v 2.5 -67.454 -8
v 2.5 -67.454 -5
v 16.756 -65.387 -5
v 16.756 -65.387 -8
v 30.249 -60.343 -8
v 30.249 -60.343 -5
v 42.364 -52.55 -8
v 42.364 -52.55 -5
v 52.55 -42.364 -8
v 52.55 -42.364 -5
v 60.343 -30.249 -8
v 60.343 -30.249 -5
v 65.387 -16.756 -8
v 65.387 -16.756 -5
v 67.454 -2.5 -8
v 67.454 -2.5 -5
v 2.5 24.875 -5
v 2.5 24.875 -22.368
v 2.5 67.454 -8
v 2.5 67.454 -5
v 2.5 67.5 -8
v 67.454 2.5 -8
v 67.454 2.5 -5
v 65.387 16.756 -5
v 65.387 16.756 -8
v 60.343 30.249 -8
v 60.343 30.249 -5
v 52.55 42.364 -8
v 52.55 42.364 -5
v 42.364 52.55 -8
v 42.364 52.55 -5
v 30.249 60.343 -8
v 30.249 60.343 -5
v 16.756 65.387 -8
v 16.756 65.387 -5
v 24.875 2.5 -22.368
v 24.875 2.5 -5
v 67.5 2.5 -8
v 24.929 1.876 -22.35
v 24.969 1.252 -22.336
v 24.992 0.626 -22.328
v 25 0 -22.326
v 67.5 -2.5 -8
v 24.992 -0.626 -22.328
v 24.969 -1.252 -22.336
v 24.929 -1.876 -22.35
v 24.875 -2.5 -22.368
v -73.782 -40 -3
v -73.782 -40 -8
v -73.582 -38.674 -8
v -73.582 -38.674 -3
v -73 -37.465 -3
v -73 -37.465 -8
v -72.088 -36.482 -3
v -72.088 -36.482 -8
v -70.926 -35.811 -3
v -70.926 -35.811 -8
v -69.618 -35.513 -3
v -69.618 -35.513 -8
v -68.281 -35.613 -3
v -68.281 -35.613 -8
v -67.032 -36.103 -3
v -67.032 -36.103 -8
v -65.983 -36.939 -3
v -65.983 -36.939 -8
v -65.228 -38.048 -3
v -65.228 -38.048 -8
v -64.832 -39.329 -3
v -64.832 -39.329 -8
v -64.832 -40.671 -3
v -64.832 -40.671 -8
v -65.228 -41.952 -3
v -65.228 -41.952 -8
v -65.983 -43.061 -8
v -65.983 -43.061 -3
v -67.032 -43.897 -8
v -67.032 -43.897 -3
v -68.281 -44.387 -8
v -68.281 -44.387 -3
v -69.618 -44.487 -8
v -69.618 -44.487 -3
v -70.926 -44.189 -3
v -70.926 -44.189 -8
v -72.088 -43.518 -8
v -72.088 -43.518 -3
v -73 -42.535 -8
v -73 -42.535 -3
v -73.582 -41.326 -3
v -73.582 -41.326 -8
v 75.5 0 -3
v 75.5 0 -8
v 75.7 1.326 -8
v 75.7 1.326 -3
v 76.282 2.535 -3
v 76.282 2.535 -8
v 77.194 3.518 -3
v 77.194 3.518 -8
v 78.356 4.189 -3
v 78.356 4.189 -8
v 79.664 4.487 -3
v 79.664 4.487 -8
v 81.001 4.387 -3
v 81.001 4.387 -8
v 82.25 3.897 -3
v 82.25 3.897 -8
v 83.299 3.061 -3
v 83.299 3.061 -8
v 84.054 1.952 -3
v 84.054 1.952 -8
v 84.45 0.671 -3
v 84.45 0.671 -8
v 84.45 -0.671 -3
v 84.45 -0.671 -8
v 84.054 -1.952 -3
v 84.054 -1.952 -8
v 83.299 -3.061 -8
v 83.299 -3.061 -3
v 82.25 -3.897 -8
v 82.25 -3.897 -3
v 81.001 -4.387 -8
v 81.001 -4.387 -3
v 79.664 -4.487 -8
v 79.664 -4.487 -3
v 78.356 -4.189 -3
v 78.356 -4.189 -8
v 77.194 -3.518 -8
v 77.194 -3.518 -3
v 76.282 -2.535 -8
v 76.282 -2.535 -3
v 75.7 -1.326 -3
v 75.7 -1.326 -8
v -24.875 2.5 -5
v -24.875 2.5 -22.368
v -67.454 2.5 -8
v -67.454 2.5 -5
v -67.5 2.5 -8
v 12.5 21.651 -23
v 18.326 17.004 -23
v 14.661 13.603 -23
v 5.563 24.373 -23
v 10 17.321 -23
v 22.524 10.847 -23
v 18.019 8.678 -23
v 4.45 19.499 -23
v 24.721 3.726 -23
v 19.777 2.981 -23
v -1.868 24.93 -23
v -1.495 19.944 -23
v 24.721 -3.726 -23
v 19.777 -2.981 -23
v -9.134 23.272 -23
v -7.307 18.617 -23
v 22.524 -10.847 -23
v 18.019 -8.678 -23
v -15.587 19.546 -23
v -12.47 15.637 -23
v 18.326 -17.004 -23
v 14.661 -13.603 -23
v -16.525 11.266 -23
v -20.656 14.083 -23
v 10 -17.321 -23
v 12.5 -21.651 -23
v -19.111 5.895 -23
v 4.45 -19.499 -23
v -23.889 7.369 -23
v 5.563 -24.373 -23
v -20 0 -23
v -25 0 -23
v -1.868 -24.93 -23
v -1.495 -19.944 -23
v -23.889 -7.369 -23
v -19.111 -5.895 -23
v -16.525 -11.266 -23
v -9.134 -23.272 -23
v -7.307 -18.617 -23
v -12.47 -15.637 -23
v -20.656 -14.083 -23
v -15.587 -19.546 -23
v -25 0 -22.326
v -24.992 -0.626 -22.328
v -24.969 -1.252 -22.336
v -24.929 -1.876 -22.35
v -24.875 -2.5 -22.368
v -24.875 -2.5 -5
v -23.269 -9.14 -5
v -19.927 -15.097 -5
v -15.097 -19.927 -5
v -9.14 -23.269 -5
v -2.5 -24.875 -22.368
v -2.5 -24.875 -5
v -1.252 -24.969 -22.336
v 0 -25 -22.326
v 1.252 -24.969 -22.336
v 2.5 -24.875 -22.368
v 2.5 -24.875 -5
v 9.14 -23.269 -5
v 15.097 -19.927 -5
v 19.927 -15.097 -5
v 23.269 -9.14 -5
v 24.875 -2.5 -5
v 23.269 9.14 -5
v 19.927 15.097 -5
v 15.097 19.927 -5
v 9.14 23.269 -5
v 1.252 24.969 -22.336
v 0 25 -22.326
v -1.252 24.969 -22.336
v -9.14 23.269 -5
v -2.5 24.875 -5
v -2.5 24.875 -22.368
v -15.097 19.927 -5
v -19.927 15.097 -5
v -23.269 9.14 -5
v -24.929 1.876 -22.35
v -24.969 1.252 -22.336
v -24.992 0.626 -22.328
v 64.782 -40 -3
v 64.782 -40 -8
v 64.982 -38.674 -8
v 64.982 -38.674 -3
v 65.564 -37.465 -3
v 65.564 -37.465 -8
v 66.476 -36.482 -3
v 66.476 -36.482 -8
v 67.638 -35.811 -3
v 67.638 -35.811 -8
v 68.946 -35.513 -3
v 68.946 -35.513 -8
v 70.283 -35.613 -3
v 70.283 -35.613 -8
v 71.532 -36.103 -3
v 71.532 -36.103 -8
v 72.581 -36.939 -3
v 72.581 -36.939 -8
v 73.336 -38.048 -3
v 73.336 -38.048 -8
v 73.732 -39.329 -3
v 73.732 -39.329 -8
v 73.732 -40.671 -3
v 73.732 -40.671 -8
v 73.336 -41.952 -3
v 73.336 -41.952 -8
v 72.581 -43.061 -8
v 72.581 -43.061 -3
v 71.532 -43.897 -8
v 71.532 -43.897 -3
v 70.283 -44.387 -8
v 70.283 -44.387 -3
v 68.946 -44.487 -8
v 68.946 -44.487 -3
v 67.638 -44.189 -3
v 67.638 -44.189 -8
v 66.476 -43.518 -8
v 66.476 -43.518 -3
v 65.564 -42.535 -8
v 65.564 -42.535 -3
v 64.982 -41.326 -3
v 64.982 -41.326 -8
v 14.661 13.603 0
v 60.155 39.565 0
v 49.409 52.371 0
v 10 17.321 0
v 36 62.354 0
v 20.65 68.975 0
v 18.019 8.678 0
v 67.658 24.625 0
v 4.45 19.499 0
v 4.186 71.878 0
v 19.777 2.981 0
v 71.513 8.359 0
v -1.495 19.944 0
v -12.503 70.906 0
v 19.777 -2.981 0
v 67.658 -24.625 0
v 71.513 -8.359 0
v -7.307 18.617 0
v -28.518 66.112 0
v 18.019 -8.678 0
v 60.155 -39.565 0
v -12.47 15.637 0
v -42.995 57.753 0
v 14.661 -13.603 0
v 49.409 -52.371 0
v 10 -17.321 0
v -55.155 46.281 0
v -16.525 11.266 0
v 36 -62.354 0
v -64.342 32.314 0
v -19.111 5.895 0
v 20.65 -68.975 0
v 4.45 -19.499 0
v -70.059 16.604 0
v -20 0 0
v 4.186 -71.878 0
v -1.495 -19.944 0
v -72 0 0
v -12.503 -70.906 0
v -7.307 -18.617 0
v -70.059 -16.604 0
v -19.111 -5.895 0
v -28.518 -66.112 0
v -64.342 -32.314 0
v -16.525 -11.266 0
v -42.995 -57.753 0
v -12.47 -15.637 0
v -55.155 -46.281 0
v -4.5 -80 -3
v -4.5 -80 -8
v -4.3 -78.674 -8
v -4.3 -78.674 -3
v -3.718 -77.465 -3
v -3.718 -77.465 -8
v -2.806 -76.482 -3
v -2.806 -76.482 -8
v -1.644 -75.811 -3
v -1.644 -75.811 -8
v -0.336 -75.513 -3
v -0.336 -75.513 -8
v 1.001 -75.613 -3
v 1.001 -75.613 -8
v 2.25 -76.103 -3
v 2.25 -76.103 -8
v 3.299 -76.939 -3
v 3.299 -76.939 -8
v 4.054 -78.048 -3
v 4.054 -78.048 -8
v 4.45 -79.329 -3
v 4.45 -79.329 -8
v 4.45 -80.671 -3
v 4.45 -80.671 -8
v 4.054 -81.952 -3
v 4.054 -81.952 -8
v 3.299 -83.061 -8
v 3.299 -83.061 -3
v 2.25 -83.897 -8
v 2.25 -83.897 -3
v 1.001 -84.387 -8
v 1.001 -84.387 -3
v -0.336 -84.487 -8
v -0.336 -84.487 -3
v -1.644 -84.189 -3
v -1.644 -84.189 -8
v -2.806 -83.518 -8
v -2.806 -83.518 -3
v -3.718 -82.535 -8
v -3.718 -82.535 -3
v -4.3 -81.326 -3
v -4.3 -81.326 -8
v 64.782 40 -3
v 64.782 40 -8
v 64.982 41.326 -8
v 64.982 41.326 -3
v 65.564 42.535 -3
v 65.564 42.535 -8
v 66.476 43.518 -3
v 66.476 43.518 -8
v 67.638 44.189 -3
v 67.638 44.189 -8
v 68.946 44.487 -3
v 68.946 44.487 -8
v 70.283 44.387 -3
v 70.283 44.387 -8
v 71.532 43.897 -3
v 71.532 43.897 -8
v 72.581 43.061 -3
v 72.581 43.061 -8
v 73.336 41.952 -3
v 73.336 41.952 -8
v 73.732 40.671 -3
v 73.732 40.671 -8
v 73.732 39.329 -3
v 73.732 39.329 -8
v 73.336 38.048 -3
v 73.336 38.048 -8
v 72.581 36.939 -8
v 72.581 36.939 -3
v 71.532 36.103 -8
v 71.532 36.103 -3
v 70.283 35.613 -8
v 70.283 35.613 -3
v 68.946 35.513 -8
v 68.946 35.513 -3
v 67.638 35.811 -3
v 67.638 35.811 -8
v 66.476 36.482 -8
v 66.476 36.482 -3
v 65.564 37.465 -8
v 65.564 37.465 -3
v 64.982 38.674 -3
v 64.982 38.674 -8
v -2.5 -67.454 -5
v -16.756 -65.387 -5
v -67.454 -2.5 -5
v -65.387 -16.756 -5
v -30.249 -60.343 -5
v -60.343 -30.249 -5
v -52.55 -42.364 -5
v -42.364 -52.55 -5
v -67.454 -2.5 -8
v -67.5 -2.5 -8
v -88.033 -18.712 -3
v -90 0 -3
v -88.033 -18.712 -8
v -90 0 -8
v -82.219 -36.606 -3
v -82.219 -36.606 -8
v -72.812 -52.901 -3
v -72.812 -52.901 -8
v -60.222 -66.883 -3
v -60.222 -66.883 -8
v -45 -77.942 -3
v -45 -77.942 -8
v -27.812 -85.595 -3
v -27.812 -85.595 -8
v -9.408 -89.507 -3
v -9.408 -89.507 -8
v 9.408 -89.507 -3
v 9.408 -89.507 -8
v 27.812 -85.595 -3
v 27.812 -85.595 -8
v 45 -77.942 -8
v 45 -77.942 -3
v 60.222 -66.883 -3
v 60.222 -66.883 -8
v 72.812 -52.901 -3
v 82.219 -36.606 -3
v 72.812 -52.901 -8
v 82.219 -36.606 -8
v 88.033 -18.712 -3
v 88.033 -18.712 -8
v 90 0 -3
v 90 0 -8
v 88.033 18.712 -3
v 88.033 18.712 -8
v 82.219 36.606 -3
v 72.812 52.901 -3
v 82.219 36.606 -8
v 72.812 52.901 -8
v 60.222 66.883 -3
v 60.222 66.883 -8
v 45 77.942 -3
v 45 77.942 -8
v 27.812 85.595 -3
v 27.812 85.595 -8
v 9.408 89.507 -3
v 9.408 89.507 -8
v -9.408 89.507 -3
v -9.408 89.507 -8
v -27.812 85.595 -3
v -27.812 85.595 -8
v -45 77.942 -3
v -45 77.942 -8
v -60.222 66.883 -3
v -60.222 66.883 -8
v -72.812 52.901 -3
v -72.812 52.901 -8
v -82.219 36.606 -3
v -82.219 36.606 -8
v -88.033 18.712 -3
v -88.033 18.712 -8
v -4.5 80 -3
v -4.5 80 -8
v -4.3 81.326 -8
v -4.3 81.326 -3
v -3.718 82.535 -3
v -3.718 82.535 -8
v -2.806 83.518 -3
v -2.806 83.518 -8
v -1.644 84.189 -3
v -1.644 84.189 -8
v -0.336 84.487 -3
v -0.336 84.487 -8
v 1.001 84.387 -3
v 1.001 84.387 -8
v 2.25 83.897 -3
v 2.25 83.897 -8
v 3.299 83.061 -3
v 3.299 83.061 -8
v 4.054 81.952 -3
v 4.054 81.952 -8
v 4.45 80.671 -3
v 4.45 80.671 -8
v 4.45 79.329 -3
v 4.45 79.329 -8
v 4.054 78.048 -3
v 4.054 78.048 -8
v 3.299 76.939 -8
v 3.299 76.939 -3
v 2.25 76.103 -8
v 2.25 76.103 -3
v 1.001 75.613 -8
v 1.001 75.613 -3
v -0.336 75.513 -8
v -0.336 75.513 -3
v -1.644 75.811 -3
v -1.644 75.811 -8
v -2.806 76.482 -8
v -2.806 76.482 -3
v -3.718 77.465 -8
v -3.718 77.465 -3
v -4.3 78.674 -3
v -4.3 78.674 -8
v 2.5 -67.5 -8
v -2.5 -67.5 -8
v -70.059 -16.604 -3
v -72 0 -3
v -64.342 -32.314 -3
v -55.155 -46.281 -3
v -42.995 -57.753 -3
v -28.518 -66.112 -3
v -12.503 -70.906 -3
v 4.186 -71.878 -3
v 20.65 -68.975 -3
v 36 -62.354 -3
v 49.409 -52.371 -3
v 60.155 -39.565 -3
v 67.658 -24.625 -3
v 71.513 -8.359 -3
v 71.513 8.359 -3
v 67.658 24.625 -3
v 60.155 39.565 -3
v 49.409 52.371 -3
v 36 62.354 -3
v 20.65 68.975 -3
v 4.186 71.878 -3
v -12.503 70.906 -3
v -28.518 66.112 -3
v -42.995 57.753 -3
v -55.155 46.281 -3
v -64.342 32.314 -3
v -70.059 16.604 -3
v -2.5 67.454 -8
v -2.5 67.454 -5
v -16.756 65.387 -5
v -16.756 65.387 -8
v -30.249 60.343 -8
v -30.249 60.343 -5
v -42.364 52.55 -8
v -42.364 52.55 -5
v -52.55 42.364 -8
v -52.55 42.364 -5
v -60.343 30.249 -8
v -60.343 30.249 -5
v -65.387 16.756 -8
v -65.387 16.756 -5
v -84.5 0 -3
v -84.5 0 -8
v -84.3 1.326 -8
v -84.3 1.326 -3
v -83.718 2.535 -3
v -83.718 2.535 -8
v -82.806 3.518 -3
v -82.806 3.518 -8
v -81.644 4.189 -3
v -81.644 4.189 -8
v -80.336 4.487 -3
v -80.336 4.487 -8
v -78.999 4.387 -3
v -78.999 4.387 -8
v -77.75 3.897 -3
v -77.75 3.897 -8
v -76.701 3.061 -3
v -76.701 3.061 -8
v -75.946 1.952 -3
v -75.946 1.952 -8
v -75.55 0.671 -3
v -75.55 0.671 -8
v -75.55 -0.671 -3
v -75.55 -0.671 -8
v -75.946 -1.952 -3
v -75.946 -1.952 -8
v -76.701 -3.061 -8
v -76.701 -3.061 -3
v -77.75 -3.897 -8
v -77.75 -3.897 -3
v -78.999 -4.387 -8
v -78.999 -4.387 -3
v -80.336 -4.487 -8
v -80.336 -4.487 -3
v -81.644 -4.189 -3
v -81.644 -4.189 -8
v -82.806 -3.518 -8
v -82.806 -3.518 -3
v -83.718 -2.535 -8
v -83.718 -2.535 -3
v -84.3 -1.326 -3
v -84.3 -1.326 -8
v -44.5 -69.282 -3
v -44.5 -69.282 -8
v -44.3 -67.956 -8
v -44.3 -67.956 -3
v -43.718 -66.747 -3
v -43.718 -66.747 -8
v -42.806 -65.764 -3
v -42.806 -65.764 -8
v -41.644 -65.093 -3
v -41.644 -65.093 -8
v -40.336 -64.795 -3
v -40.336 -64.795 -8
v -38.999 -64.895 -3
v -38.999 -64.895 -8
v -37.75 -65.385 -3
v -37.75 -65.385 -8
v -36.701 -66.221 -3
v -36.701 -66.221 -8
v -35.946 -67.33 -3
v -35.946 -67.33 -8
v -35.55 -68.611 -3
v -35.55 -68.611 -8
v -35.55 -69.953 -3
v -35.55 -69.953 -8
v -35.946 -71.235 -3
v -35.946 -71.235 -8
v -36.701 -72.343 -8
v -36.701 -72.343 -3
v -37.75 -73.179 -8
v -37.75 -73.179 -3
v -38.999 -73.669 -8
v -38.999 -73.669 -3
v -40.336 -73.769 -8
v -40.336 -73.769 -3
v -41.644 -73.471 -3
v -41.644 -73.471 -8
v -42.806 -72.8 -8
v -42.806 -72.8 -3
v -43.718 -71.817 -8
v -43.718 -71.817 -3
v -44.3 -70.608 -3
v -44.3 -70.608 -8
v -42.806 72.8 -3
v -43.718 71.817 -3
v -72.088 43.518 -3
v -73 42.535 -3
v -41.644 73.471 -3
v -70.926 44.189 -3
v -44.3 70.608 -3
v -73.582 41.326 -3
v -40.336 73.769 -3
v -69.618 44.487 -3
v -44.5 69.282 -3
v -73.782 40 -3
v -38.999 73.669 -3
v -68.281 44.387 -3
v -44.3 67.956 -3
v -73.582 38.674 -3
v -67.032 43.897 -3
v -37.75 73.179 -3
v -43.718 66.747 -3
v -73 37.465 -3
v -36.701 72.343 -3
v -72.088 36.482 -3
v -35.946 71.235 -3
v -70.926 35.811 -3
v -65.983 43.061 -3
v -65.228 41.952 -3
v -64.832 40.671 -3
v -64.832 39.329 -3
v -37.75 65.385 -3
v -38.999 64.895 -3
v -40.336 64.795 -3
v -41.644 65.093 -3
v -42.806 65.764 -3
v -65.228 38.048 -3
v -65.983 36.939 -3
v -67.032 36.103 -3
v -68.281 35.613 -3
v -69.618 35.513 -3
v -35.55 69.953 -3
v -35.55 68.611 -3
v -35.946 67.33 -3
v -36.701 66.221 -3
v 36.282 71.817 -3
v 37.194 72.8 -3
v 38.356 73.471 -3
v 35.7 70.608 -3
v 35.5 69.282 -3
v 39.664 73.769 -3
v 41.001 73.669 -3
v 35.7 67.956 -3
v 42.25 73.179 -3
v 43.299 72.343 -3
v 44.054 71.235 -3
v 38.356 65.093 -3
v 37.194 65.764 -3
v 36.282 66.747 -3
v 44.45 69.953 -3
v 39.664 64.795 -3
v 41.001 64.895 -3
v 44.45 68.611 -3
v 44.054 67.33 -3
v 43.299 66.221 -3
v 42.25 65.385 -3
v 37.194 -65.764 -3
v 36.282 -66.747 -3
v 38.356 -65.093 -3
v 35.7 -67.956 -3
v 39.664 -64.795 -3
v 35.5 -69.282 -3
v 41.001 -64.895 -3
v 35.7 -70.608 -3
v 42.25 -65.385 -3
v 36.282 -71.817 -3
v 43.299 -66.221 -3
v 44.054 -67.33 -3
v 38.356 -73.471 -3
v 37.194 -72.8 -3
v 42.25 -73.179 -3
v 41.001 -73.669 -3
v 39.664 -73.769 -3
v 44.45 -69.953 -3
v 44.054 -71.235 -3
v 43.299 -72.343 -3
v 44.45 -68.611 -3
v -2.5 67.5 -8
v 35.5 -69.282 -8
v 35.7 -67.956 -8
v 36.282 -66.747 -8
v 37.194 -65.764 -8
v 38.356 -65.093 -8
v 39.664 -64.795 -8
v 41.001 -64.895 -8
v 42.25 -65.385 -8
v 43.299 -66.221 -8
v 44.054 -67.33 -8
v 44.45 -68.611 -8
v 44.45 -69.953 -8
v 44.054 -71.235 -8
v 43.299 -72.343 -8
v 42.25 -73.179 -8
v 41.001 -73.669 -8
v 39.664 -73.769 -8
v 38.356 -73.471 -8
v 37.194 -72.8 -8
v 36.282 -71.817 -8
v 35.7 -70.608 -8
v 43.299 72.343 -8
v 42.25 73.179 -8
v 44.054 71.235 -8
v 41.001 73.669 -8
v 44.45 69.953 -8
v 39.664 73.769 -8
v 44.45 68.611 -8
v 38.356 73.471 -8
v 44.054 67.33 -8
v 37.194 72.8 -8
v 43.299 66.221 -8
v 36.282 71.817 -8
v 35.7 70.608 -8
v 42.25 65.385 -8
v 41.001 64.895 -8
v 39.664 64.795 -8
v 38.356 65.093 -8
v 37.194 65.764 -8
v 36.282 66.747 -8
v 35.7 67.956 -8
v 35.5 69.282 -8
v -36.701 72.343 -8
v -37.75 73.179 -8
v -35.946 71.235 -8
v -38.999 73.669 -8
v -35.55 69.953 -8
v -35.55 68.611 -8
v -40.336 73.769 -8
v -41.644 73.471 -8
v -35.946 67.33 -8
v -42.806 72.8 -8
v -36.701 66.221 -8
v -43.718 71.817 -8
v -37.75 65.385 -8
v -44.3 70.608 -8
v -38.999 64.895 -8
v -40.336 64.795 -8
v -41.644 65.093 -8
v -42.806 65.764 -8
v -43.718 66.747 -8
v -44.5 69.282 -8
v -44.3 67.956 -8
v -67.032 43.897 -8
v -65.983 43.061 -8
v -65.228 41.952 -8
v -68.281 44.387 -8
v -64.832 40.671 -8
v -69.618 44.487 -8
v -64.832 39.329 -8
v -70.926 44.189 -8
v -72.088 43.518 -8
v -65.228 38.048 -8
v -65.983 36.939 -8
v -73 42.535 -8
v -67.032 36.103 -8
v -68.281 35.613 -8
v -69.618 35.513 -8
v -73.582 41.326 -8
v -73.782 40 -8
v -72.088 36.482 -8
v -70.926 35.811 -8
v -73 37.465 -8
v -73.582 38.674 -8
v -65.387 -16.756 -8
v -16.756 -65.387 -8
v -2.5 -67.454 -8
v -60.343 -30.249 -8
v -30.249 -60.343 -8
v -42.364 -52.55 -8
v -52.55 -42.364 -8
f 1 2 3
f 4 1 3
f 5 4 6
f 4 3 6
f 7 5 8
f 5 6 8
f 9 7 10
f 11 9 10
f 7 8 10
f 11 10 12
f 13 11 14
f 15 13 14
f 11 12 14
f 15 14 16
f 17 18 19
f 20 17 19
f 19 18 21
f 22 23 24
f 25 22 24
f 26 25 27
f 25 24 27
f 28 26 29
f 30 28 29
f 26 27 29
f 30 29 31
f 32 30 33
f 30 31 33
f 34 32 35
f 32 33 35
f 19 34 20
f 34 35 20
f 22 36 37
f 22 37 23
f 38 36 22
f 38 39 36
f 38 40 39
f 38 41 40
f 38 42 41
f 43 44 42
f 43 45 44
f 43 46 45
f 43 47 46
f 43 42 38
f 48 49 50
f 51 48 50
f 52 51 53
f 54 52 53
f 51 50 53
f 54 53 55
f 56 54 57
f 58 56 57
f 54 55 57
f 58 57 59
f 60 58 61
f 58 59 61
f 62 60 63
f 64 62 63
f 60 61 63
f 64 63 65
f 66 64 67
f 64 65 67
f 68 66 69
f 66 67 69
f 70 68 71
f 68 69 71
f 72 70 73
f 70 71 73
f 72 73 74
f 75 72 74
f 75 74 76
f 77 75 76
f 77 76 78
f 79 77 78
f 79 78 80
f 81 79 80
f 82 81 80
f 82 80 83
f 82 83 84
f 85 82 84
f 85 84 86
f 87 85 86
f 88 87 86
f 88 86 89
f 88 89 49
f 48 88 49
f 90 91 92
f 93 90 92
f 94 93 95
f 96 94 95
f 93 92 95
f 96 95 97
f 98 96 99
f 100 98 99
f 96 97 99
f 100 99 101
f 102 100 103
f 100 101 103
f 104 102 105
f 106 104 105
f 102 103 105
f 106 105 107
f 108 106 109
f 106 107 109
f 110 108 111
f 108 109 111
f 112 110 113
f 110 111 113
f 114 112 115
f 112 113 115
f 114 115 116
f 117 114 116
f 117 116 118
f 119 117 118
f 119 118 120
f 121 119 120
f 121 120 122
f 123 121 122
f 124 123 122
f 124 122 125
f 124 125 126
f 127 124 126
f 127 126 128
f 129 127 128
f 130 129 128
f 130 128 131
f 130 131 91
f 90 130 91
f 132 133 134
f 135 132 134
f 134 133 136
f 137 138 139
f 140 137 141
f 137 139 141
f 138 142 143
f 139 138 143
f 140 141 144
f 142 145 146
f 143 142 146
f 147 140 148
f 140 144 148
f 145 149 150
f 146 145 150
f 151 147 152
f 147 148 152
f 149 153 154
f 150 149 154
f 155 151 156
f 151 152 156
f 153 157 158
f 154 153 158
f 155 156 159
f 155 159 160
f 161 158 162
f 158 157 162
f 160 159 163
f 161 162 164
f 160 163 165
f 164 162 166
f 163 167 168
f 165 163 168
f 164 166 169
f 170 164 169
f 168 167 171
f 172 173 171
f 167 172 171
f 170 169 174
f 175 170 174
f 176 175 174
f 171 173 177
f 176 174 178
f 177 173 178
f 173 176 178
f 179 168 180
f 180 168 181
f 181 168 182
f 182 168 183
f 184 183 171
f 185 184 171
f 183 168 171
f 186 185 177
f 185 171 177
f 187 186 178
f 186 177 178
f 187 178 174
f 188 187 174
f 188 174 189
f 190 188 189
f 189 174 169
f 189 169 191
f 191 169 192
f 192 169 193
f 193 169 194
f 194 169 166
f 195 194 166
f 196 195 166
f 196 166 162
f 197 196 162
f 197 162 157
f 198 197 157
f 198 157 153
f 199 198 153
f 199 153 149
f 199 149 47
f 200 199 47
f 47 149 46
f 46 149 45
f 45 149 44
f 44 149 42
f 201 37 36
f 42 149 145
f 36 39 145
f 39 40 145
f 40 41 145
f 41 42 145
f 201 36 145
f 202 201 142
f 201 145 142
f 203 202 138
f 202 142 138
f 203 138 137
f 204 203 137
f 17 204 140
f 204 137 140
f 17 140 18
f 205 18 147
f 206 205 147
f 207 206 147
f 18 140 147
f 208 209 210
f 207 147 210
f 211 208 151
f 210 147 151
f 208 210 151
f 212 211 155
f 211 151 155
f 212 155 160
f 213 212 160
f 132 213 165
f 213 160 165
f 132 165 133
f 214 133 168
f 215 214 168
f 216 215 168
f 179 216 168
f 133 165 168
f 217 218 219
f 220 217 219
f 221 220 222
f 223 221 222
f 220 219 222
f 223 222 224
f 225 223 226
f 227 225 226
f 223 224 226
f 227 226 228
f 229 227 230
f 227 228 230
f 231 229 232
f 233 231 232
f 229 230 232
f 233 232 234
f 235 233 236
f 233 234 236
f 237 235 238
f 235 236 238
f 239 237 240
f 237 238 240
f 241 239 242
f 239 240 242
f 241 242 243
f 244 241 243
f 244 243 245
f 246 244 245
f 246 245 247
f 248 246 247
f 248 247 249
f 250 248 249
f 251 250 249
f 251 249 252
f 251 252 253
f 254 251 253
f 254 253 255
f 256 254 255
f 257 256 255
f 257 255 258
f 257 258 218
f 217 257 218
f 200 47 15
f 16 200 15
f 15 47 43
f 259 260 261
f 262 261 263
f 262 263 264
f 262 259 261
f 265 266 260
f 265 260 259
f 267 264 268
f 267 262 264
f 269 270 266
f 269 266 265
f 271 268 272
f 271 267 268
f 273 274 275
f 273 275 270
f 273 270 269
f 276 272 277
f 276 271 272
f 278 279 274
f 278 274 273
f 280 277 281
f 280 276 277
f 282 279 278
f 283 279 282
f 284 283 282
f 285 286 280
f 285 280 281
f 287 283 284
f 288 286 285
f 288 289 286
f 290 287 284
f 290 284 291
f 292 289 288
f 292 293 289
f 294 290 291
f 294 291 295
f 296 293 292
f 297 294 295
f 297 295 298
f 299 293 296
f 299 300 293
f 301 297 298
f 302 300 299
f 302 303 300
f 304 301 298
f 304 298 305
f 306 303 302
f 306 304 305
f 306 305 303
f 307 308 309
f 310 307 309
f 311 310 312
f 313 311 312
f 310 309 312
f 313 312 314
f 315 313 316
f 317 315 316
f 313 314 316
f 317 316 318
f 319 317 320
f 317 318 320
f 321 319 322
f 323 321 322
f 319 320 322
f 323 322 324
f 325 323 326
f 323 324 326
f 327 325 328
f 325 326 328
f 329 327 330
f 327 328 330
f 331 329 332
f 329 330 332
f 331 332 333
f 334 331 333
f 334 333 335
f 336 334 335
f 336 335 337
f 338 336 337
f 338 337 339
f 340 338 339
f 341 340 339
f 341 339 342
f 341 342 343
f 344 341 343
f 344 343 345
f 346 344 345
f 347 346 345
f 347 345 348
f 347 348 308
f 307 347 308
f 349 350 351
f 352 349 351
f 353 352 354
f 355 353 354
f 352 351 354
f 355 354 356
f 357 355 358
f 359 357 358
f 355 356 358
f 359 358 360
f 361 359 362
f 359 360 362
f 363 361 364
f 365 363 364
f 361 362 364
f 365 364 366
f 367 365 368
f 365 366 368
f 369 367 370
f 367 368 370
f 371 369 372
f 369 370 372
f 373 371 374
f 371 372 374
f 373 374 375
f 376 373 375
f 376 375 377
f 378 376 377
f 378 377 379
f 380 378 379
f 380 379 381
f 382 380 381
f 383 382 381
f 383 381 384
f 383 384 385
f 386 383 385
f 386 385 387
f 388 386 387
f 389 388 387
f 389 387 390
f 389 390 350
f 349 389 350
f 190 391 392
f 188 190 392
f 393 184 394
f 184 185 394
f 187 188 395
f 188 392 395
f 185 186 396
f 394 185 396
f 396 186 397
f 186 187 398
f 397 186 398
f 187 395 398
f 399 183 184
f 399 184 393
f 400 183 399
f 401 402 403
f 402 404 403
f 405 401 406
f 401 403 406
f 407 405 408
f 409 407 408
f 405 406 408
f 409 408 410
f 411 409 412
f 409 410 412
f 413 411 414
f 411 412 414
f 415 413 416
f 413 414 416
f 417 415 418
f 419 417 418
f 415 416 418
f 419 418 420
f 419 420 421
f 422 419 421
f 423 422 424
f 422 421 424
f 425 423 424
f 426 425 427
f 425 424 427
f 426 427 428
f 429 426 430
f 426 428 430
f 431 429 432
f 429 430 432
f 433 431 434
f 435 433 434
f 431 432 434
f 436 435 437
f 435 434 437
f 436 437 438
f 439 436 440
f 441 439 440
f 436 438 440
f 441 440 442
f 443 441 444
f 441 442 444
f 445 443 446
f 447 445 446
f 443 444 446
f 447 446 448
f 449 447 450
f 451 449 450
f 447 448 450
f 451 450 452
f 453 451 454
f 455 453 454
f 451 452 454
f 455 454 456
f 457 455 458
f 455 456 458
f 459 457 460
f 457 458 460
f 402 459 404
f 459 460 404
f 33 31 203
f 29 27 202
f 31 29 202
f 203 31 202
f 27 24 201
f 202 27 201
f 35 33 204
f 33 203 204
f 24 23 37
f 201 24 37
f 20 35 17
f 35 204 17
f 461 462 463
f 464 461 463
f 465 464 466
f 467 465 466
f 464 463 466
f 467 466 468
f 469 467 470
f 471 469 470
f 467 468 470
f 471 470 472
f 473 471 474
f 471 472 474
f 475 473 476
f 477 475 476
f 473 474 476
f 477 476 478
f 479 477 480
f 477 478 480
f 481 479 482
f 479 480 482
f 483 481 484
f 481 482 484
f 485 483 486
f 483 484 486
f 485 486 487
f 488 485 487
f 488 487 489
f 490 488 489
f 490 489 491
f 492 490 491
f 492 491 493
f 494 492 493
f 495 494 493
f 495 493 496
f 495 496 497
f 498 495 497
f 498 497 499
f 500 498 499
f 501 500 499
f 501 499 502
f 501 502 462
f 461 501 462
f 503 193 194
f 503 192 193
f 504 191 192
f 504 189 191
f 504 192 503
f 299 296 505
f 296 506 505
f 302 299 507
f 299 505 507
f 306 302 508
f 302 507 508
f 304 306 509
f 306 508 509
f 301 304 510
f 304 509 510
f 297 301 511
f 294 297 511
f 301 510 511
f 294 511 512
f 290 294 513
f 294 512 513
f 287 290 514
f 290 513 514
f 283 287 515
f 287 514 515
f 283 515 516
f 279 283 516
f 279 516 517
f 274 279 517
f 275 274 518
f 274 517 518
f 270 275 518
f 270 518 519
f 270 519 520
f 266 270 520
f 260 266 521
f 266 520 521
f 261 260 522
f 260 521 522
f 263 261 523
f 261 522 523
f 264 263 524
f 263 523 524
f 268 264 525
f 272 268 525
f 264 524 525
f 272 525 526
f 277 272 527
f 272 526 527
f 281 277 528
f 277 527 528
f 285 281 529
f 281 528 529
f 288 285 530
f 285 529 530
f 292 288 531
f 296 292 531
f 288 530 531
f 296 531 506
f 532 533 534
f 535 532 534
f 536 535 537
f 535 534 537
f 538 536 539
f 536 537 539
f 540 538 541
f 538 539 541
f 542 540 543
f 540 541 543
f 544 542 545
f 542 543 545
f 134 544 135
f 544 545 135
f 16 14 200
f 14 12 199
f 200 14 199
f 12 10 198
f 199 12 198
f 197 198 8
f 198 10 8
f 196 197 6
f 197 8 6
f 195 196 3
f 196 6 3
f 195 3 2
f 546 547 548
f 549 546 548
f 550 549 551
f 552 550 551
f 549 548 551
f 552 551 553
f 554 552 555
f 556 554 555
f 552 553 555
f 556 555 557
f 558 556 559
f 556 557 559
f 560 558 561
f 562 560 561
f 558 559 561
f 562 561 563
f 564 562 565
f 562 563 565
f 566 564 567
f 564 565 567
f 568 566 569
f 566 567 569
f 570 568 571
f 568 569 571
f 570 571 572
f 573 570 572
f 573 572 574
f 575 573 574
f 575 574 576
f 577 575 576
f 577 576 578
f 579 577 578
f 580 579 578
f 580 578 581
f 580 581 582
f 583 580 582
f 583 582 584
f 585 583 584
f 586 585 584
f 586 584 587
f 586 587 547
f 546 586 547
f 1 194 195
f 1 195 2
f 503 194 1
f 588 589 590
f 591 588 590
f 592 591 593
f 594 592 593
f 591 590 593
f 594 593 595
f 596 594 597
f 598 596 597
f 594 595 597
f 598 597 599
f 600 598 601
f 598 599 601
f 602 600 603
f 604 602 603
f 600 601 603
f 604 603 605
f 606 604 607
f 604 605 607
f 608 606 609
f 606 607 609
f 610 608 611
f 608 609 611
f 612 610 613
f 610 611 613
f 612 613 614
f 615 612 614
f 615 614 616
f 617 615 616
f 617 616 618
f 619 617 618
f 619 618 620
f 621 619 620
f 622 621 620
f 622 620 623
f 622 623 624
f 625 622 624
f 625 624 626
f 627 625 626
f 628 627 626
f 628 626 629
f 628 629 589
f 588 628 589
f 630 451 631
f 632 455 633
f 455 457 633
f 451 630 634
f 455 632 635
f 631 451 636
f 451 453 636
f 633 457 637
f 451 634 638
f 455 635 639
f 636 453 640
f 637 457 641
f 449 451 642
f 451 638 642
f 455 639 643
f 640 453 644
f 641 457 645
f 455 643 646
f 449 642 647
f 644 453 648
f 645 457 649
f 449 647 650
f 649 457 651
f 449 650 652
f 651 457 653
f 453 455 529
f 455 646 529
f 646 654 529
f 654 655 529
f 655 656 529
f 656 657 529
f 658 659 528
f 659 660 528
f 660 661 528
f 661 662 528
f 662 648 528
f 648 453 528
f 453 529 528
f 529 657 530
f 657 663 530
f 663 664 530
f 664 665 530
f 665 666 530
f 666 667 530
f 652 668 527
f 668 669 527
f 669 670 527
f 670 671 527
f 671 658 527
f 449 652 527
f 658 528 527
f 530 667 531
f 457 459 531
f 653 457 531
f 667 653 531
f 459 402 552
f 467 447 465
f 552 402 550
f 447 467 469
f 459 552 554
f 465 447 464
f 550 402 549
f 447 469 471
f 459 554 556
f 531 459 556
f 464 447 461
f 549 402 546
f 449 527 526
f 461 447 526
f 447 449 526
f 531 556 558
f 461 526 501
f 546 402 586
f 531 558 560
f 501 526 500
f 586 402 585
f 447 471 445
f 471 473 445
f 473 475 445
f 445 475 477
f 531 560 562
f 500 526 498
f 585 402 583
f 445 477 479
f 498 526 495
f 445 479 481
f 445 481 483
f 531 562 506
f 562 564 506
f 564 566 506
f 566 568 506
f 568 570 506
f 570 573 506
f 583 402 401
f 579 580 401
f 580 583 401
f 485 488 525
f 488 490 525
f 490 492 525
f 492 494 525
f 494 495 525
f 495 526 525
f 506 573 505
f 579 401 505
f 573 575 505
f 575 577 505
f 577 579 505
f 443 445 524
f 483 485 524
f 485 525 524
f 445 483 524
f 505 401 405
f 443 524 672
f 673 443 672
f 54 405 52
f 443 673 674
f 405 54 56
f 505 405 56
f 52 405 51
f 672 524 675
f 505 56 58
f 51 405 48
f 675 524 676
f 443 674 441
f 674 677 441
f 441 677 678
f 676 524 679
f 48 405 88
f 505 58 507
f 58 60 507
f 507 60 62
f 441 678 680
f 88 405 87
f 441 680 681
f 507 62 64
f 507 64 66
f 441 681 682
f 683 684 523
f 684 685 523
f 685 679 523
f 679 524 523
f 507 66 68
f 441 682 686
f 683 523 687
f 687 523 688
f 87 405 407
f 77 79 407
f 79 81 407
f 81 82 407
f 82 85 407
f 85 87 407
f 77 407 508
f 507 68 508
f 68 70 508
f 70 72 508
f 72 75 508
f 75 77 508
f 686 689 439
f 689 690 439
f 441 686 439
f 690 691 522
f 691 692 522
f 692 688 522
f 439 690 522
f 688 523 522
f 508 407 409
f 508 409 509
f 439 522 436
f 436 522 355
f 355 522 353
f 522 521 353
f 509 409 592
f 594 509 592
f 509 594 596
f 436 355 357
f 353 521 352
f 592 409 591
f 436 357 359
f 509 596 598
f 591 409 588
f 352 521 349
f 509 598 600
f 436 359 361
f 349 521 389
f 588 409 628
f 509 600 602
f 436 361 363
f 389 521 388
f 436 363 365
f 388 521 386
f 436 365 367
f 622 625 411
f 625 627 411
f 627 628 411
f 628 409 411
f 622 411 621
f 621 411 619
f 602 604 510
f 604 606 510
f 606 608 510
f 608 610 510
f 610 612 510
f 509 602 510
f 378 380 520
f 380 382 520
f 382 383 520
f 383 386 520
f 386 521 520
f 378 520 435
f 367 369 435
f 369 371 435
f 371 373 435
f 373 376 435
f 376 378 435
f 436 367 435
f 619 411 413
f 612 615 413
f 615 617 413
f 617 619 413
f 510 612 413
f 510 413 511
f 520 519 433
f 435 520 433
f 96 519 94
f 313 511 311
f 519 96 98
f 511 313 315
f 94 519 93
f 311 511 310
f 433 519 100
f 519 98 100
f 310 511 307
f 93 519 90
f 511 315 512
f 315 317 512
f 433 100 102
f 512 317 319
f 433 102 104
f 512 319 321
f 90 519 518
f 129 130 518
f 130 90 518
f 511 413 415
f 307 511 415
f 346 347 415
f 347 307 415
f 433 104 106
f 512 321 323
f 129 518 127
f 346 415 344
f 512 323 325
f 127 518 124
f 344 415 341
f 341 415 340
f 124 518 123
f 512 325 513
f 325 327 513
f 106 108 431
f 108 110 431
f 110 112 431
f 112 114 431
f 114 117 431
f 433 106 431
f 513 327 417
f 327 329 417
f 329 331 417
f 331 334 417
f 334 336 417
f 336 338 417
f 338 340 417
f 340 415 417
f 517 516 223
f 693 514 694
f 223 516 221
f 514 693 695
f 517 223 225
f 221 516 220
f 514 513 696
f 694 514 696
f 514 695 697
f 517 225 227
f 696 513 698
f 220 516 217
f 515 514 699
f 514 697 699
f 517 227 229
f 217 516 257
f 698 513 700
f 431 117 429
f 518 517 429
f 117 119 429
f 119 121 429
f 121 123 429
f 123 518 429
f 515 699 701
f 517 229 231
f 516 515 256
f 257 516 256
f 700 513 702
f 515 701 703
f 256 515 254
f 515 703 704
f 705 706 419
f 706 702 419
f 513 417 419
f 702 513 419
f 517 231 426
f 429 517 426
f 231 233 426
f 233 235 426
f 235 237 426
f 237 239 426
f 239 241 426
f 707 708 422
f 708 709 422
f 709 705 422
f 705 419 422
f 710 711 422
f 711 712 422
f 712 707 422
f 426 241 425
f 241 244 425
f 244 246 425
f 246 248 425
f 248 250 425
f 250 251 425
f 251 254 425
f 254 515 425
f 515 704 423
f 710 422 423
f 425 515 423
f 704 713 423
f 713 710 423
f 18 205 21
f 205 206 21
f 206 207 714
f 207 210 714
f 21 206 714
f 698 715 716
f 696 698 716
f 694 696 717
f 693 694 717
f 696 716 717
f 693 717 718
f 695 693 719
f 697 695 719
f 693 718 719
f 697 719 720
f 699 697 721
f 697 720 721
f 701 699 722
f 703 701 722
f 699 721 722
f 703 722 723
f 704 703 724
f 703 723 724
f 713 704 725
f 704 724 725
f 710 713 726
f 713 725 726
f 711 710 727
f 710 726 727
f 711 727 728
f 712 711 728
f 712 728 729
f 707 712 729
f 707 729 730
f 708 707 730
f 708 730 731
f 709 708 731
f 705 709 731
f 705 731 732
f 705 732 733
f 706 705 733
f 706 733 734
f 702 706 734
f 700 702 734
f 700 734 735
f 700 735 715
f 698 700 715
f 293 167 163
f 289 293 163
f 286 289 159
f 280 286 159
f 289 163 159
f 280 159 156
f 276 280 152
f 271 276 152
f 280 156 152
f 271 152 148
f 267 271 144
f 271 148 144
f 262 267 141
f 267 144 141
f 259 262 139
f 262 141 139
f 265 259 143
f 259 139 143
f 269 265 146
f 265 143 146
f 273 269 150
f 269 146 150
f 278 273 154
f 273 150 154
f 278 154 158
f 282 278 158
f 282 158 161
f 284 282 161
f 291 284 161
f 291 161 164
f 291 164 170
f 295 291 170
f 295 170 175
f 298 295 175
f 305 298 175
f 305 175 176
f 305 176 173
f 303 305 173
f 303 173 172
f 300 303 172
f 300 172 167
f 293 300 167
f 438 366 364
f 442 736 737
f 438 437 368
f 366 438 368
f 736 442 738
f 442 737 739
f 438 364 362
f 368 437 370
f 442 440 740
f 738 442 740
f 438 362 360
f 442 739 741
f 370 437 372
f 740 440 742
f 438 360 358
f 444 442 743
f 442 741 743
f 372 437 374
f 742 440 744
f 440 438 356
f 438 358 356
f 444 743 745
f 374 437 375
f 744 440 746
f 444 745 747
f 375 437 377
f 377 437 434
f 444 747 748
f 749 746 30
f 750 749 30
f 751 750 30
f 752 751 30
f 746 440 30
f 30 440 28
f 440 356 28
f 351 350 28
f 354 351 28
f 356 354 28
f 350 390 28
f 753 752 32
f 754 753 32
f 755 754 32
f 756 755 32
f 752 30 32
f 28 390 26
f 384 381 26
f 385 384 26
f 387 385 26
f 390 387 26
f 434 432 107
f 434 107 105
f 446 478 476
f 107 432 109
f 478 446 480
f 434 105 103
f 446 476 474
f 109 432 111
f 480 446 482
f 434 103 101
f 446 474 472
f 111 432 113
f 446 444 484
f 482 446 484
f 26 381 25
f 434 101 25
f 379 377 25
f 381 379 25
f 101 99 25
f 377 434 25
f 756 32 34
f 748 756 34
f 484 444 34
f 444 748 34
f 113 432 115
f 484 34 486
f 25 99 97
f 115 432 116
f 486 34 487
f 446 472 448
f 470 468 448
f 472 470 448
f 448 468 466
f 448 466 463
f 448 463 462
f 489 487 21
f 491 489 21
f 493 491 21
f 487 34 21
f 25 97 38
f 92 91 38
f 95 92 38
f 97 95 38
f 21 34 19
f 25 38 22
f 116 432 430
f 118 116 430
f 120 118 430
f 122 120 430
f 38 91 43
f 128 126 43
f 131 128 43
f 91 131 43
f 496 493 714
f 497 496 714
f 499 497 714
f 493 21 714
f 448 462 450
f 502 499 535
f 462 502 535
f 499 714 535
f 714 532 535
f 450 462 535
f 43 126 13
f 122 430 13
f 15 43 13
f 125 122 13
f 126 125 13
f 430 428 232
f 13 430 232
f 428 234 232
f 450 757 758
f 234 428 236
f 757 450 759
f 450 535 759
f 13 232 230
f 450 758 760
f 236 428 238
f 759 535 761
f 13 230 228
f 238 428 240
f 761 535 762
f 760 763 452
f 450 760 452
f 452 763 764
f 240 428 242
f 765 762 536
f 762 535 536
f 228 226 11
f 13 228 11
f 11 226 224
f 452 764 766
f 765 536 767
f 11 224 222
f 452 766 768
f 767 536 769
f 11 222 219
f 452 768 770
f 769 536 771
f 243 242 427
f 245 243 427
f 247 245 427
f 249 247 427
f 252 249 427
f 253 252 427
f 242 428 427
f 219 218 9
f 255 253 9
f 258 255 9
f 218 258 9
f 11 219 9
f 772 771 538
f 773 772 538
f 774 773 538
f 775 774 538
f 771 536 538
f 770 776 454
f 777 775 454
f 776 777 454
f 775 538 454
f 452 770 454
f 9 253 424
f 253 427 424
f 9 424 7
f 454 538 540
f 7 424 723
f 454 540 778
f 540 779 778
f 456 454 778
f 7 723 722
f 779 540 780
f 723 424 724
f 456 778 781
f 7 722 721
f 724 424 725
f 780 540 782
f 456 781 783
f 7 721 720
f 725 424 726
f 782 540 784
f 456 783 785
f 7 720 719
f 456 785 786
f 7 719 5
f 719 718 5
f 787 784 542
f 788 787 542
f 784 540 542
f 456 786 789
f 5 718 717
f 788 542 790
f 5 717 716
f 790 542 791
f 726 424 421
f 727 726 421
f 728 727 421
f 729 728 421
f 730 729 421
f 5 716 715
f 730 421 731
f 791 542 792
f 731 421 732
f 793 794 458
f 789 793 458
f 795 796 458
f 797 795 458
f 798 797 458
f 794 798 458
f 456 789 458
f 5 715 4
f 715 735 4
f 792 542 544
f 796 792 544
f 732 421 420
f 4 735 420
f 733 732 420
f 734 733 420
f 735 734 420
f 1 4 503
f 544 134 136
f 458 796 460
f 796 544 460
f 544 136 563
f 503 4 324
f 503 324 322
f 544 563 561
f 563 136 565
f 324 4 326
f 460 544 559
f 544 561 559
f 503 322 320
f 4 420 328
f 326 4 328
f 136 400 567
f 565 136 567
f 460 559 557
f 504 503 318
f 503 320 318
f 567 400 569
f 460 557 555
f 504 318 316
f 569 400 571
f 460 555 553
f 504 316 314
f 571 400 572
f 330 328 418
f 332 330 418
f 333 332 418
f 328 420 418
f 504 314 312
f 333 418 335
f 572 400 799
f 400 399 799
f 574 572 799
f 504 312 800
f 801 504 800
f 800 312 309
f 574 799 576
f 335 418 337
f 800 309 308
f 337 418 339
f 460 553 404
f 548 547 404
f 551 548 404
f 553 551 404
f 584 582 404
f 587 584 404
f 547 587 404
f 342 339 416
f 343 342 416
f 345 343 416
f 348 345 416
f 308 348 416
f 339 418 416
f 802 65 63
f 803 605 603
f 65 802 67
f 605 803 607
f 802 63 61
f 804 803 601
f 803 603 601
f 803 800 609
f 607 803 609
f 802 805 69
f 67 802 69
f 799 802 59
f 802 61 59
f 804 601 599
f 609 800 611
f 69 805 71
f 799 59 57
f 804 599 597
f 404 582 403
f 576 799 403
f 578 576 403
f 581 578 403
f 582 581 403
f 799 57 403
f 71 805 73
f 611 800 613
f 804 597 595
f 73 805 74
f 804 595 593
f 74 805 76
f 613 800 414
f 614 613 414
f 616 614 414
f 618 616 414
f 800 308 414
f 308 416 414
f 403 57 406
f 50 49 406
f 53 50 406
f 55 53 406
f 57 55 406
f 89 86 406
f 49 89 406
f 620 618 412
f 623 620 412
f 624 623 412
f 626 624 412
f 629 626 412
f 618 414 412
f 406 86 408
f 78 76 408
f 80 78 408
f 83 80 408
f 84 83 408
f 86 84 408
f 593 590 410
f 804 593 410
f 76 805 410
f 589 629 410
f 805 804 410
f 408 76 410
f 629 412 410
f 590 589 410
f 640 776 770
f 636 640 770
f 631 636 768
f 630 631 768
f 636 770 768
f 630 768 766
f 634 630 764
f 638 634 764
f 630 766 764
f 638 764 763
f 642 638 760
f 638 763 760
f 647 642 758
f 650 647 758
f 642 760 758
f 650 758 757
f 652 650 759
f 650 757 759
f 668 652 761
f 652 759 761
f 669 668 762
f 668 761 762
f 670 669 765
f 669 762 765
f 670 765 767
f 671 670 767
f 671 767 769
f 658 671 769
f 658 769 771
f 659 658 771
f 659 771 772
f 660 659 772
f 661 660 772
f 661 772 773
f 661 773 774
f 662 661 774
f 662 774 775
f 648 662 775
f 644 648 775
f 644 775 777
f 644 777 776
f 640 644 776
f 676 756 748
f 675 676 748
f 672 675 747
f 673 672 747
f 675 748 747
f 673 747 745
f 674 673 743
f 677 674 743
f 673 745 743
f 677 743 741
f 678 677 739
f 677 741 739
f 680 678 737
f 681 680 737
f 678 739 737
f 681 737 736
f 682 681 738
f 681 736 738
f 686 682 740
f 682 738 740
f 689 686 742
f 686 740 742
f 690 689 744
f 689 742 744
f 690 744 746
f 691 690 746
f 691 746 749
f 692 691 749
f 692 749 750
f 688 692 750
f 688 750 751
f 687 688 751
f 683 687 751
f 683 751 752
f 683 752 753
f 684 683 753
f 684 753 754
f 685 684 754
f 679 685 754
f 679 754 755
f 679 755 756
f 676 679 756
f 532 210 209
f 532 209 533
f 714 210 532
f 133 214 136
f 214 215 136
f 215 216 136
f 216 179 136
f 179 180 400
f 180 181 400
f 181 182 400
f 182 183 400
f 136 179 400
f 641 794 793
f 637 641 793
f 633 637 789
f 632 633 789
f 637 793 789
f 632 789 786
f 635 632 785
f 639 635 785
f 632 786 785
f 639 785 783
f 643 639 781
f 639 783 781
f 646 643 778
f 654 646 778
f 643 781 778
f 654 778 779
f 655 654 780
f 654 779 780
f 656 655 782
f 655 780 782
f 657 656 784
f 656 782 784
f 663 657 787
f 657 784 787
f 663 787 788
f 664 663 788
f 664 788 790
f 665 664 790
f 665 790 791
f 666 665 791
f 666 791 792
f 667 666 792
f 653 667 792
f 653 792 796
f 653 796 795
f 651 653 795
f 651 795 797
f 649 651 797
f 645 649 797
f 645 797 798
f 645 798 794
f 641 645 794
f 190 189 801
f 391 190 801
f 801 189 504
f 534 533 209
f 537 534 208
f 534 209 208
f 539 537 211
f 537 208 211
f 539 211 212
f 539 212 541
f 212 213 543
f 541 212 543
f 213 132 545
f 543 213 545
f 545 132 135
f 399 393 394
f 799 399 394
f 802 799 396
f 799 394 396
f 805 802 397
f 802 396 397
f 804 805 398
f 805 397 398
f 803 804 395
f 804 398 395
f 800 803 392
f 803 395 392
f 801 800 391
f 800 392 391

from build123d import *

# Parameters (mm, degrees)
IZIM2_R               = 20
KES_EKSTR_ZYON1_DEPTH = 130.340635533
FEDER6_REACH          = 131.341
IZIM3_WALL_W          = 307.641360504
IZIM3_WALL_H          = 5
FEDER7_REACH          = 131.341
IZIM4_WALL_W          = 307.641360504
IZIM4_WALL_H          = 5
KES_EKSTR_ZYON2_REACH = 130.16
IZIM5_R               = 4.5


with BuildPart() as part:
    # Çizim1 → Döndür1 (revolve)
    with BuildSketch(Plane(origin=(0, 0, 0), x_dir=(0, 0, -1), z_dir=(1, 0, 0)), mode=Mode.PRIVATE) as d_nd_r1_sk:
        Polygon((0, 20), (0, 72), (3, 72), (3, 90), (8, 90), (8, 67.5), (5, 67.5), (5, 25), (23, 25), (23, 0), (0, 0), align=None)
    revolve(d_nd_r1_sk.sketch.rotate(Axis((0, 0, 0), (0, 0, 1)), 90), axis=Axis((0, 0, 0), (0, 0, 1)))

    # Çizim2 → Kes-Ekstrüzyon1 (cut, through all)
    with BuildSketch(Plane(origin=(0, 0, -23), x_dir=(-1, 0, 0), z_dir=(0, 0, -1))):
        Circle(IZIM2_R)
    extrude(amount=-KES_EKSTR_ZYON1_DEPTH, mode=Mode.SUBTRACT)

    # Çizim3 wall → Feder6 (add, up to next)
    with BuildSketch(Plane(origin=(0, 45.25, -15.5), x_dir=(0, 0.947613186704, 0.319420175294), z_dir=(0, -0.319420175294, 0.947613186704)), mode=Mode.PRIVATE) as feder6_sk1:
        Rectangle(IZIM3_WALL_W, IZIM3_WALL_H)
    feder6_tool1 = extrude(feder6_sk1.sketch, amount=FEDER6_REACH, mode=Mode.PRIVATE) - part.part
    feder6 = feder6_tool1.solids().sort_by_distance((0, 45.25, -15.5))[0]
    add(feder6)

    # Aynalama1: Feder6 across plane
    add(feder6.mirror(Plane.ZX))

    # Çizim4 wall → Feder7 (add, up to next)
    with BuildSketch(Plane(origin=(-45.25, 0, -15.5), x_dir=(-0.947613186704, 0, 0.319420175294), z_dir=(0.319420175294, 0, 0.947613186704)), mode=Mode.PRIVATE) as feder7_sk1:
        Rectangle(IZIM4_WALL_W, IZIM4_WALL_H)
    feder7_tool1 = extrude(feder7_sk1.sketch, amount=FEDER7_REACH, mode=Mode.PRIVATE) - part.part
    feder7 = feder7_tool1.solids().sort_by_distance((-45.25, 0, -15.5))[0]
    add(feder7)

    # Aynalama2: Feder7 across plane
    add(feder7.mirror(Plane(origin=(0, 0, 0), x_dir=(0, 0, 1), z_dir=(1, 0, 0))))

    # Çizim5 → Kes-Ekstrüzyon2 (cut, up to next)
    with BuildSketch(Plane(origin=(0, 0, -8), x_dir=(-1, 0, 0), z_dir=(0, 0, -1)), mode=Mode.PRIVATE) as kes_ekstr_zyon2_sk1:
        with Locations((0, 80)):
            Circle(IZIM5_R)
    kes_ekstr_zyon2_tool1 = extrude(kes_ekstr_zyon2_sk1.sketch, amount=-KES_EKSTR_ZYON2_REACH, mode=Mode.PRIVATE) & part.part
    # Çizim5 → Kes-Ekstrüzyon2 (cut, up to next)
    with BuildSketch(Plane(origin=(0, 0, -8), x_dir=(-1, 0, 0), z_dir=(0, 0, -1)), mode=Mode.PRIVATE) as kes_ekstr_zyon2_sk2:
        with Locations((40, 69.282032303)):
            Circle(IZIM5_R)
    kes_ekstr_zyon2_tool2 = extrude(kes_ekstr_zyon2_sk2.sketch, amount=-KES_EKSTR_ZYON2_REACH, mode=Mode.PRIVATE) & part.part
    # Çizim5 → Kes-Ekstrüzyon2 (cut, up to next)
    with BuildSketch(Plane(origin=(0, 0, -8), x_dir=(-1, 0, 0), z_dir=(0, 0, -1)), mode=Mode.PRIVATE) as kes_ekstr_zyon2_sk3:
        with Locations((69.282032303, 40)):
            Circle(IZIM5_R)
    kes_ekstr_zyon2_tool3 = extrude(kes_ekstr_zyon2_sk3.sketch, amount=-KES_EKSTR_ZYON2_REACH, mode=Mode.PRIVATE) & part.part
    # Çizim5 → Kes-Ekstrüzyon2 (cut, up to next)
    with BuildSketch(Plane(origin=(0, 0, -8), x_dir=(-1, 0, 0), z_dir=(0, 0, -1)), mode=Mode.PRIVATE) as kes_ekstr_zyon2_sk4:
        with Locations((80, 0)):
            Circle(IZIM5_R)
    kes_ekstr_zyon2_tool4 = extrude(kes_ekstr_zyon2_sk4.sketch, amount=-KES_EKSTR_ZYON2_REACH, mode=Mode.PRIVATE) & part.part
    # Çizim5 → Kes-Ekstrüzyon2 (cut, up to next)
    with BuildSketch(Plane(origin=(0, 0, -8), x_dir=(-1, 0, 0), z_dir=(0, 0, -1)), mode=Mode.PRIVATE) as kes_ekstr_zyon2_sk5:
        with Locations((69.282032303, -40)):
            Circle(IZIM5_R)
    kes_ekstr_zyon2_tool5 = extrude(kes_ekstr_zyon2_sk5.sketch, amount=-KES_EKSTR_ZYON2_REACH, mode=Mode.PRIVATE) & part.part
    # Çizim5 → Kes-Ekstrüzyon2 (cut, up to next)
    with BuildSketch(Plane(origin=(0, 0, -8), x_dir=(-1, 0, 0), z_dir=(0, 0, -1)), mode=Mode.PRIVATE) as kes_ekstr_zyon2_sk6:
        with Locations((40, -69.282032303)):
            Circle(IZIM5_R)
    kes_ekstr_zyon2_tool6 = extrude(kes_ekstr_zyon2_sk6.sketch, amount=-KES_EKSTR_ZYON2_REACH, mode=Mode.PRIVATE) & part.part
    # Çizim5 → Kes-Ekstrüzyon2 (cut, up to next)
    with BuildSketch(Plane(origin=(0, 0, -8), x_dir=(-1, 0, 0), z_dir=(0, 0, -1)), mode=Mode.PRIVATE) as kes_ekstr_zyon2_sk7:
        with Locations((0, -80)):
            Circle(IZIM5_R)
    kes_ekstr_zyon2_tool7 = extrude(kes_ekstr_zyon2_sk7.sketch, amount=-KES_EKSTR_ZYON2_REACH, mode=Mode.PRIVATE) & part.part
    # Çizim5 → Kes-Ekstrüzyon2 (cut, up to next)
    with BuildSketch(Plane(origin=(0, 0, -8), x_dir=(-1, 0, 0), z_dir=(0, 0, -1)), mode=Mode.PRIVATE) as kes_ekstr_zyon2_sk8:
        with Locations((-40, -69.282032303)):
            Circle(IZIM5_R)
    kes_ekstr_zyon2_tool8 = extrude(kes_ekstr_zyon2_sk8.sketch, amount=-KES_EKSTR_ZYON2_REACH, mode=Mode.PRIVATE) & part.part
    # Çizim5 → Kes-Ekstrüzyon2 (cut, up to next)
    with BuildSketch(Plane(origin=(0, 0, -8), x_dir=(-1, 0, 0), z_dir=(0, 0, -1)), mode=Mode.PRIVATE) as kes_ekstr_zyon2_sk9:
        with Locations((-69.282032303, -40)):
            Circle(IZIM5_R)
    kes_ekstr_zyon2_tool9 = extrude(kes_ekstr_zyon2_sk9.sketch, amount=-KES_EKSTR_ZYON2_REACH, mode=Mode.PRIVATE) & part.part
    # Çizim5 → Kes-Ekstrüzyon2 (cut, up to next)
    with BuildSketch(Plane(origin=(0, 0, -8), x_dir=(-1, 0, 0), z_dir=(0, 0, -1)), mode=Mode.PRIVATE) as kes_ekstr_zyon2_sk10:
        with Locations((-80, 0)):
            Circle(IZIM5_R)
    kes_ekstr_zyon2_tool10 = extrude(kes_ekstr_zyon2_sk10.sketch, amount=-KES_EKSTR_ZYON2_REACH, mode=Mode.PRIVATE) & part.part
    # Çizim5 → Kes-Ekstrüzyon2 (cut, up to next)
    with BuildSketch(Plane(origin=(0, 0, -8), x_dir=(-1, 0, 0), z_dir=(0, 0, -1)), mode=Mode.PRIVATE) as kes_ekstr_zyon2_sk11:
        with Locations((-69.282032303, 40)):
            Circle(IZIM5_R)
    kes_ekstr_zyon2_tool11 = extrude(kes_ekstr_zyon2_sk11.sketch, amount=-KES_EKSTR_ZYON2_REACH, mode=Mode.PRIVATE) & part.part
    # Çizim5 → Kes-Ekstrüzyon2 (cut, up to next)
    with BuildSketch(Plane(origin=(0, 0, -8), x_dir=(-1, 0, 0), z_dir=(0, 0, -1)), mode=Mode.PRIVATE) as kes_ekstr_zyon2_sk12:
        with Locations((-40, 69.282032303)):
            Circle(IZIM5_R)
    kes_ekstr_zyon2_tool12 = extrude(kes_ekstr_zyon2_sk12.sketch, amount=-KES_EKSTR_ZYON2_REACH, mode=Mode.PRIVATE) & part.part
    add(kes_ekstr_zyon2_tool1.solids().sort_by_distance((0, 80, -8))[0], mode=Mode.SUBTRACT)
    add(kes_ekstr_zyon2_tool2.solids().sort_by_distance((-40, 69.282032, -8))[0], mode=Mode.SUBTRACT)
    add(kes_ekstr_zyon2_tool3.solids().sort_by_distance((-69.282032, 40, -8))[0], mode=Mode.SUBTRACT)
    add(kes_ekstr_zyon2_tool4.solids().sort_by_distance((-80, 0, -8))[0], mode=Mode.SUBTRACT)
    add(kes_ekstr_zyon2_tool5.solids().sort_by_distance((-69.282032, -40, -8))[0], mode=Mode.SUBTRACT)
    add(kes_ekstr_zyon2_tool6.solids().sort_by_distance((-40, -69.282032, -8))[0], mode=Mode.SUBTRACT)
    add(kes_ekstr_zyon2_tool7.solids().sort_by_distance((0, -80, -8))[0], mode=Mode.SUBTRACT)
    add(kes_ekstr_zyon2_tool8.solids().sort_by_distance((40, -69.282032, -8))[0], mode=Mode.SUBTRACT)
    add(kes_ekstr_zyon2_tool9.solids().sort_by_distance((69.282032, -40, -8))[0], mode=Mode.SUBTRACT)
    add(kes_ekstr_zyon2_tool10.solids().sort_by_distance((80, 0, -8))[0], mode=Mode.SUBTRACT)
    add(kes_ekstr_zyon2_tool11.solids().sort_by_distance((69.282032, 40, -8))[0], mode=Mode.SUBTRACT)
    add(kes_ekstr_zyon2_tool12.solids().sort_by_distance((40, 69.282032, -8))[0], mode=Mode.SUBTRACT)


solid = part.part
